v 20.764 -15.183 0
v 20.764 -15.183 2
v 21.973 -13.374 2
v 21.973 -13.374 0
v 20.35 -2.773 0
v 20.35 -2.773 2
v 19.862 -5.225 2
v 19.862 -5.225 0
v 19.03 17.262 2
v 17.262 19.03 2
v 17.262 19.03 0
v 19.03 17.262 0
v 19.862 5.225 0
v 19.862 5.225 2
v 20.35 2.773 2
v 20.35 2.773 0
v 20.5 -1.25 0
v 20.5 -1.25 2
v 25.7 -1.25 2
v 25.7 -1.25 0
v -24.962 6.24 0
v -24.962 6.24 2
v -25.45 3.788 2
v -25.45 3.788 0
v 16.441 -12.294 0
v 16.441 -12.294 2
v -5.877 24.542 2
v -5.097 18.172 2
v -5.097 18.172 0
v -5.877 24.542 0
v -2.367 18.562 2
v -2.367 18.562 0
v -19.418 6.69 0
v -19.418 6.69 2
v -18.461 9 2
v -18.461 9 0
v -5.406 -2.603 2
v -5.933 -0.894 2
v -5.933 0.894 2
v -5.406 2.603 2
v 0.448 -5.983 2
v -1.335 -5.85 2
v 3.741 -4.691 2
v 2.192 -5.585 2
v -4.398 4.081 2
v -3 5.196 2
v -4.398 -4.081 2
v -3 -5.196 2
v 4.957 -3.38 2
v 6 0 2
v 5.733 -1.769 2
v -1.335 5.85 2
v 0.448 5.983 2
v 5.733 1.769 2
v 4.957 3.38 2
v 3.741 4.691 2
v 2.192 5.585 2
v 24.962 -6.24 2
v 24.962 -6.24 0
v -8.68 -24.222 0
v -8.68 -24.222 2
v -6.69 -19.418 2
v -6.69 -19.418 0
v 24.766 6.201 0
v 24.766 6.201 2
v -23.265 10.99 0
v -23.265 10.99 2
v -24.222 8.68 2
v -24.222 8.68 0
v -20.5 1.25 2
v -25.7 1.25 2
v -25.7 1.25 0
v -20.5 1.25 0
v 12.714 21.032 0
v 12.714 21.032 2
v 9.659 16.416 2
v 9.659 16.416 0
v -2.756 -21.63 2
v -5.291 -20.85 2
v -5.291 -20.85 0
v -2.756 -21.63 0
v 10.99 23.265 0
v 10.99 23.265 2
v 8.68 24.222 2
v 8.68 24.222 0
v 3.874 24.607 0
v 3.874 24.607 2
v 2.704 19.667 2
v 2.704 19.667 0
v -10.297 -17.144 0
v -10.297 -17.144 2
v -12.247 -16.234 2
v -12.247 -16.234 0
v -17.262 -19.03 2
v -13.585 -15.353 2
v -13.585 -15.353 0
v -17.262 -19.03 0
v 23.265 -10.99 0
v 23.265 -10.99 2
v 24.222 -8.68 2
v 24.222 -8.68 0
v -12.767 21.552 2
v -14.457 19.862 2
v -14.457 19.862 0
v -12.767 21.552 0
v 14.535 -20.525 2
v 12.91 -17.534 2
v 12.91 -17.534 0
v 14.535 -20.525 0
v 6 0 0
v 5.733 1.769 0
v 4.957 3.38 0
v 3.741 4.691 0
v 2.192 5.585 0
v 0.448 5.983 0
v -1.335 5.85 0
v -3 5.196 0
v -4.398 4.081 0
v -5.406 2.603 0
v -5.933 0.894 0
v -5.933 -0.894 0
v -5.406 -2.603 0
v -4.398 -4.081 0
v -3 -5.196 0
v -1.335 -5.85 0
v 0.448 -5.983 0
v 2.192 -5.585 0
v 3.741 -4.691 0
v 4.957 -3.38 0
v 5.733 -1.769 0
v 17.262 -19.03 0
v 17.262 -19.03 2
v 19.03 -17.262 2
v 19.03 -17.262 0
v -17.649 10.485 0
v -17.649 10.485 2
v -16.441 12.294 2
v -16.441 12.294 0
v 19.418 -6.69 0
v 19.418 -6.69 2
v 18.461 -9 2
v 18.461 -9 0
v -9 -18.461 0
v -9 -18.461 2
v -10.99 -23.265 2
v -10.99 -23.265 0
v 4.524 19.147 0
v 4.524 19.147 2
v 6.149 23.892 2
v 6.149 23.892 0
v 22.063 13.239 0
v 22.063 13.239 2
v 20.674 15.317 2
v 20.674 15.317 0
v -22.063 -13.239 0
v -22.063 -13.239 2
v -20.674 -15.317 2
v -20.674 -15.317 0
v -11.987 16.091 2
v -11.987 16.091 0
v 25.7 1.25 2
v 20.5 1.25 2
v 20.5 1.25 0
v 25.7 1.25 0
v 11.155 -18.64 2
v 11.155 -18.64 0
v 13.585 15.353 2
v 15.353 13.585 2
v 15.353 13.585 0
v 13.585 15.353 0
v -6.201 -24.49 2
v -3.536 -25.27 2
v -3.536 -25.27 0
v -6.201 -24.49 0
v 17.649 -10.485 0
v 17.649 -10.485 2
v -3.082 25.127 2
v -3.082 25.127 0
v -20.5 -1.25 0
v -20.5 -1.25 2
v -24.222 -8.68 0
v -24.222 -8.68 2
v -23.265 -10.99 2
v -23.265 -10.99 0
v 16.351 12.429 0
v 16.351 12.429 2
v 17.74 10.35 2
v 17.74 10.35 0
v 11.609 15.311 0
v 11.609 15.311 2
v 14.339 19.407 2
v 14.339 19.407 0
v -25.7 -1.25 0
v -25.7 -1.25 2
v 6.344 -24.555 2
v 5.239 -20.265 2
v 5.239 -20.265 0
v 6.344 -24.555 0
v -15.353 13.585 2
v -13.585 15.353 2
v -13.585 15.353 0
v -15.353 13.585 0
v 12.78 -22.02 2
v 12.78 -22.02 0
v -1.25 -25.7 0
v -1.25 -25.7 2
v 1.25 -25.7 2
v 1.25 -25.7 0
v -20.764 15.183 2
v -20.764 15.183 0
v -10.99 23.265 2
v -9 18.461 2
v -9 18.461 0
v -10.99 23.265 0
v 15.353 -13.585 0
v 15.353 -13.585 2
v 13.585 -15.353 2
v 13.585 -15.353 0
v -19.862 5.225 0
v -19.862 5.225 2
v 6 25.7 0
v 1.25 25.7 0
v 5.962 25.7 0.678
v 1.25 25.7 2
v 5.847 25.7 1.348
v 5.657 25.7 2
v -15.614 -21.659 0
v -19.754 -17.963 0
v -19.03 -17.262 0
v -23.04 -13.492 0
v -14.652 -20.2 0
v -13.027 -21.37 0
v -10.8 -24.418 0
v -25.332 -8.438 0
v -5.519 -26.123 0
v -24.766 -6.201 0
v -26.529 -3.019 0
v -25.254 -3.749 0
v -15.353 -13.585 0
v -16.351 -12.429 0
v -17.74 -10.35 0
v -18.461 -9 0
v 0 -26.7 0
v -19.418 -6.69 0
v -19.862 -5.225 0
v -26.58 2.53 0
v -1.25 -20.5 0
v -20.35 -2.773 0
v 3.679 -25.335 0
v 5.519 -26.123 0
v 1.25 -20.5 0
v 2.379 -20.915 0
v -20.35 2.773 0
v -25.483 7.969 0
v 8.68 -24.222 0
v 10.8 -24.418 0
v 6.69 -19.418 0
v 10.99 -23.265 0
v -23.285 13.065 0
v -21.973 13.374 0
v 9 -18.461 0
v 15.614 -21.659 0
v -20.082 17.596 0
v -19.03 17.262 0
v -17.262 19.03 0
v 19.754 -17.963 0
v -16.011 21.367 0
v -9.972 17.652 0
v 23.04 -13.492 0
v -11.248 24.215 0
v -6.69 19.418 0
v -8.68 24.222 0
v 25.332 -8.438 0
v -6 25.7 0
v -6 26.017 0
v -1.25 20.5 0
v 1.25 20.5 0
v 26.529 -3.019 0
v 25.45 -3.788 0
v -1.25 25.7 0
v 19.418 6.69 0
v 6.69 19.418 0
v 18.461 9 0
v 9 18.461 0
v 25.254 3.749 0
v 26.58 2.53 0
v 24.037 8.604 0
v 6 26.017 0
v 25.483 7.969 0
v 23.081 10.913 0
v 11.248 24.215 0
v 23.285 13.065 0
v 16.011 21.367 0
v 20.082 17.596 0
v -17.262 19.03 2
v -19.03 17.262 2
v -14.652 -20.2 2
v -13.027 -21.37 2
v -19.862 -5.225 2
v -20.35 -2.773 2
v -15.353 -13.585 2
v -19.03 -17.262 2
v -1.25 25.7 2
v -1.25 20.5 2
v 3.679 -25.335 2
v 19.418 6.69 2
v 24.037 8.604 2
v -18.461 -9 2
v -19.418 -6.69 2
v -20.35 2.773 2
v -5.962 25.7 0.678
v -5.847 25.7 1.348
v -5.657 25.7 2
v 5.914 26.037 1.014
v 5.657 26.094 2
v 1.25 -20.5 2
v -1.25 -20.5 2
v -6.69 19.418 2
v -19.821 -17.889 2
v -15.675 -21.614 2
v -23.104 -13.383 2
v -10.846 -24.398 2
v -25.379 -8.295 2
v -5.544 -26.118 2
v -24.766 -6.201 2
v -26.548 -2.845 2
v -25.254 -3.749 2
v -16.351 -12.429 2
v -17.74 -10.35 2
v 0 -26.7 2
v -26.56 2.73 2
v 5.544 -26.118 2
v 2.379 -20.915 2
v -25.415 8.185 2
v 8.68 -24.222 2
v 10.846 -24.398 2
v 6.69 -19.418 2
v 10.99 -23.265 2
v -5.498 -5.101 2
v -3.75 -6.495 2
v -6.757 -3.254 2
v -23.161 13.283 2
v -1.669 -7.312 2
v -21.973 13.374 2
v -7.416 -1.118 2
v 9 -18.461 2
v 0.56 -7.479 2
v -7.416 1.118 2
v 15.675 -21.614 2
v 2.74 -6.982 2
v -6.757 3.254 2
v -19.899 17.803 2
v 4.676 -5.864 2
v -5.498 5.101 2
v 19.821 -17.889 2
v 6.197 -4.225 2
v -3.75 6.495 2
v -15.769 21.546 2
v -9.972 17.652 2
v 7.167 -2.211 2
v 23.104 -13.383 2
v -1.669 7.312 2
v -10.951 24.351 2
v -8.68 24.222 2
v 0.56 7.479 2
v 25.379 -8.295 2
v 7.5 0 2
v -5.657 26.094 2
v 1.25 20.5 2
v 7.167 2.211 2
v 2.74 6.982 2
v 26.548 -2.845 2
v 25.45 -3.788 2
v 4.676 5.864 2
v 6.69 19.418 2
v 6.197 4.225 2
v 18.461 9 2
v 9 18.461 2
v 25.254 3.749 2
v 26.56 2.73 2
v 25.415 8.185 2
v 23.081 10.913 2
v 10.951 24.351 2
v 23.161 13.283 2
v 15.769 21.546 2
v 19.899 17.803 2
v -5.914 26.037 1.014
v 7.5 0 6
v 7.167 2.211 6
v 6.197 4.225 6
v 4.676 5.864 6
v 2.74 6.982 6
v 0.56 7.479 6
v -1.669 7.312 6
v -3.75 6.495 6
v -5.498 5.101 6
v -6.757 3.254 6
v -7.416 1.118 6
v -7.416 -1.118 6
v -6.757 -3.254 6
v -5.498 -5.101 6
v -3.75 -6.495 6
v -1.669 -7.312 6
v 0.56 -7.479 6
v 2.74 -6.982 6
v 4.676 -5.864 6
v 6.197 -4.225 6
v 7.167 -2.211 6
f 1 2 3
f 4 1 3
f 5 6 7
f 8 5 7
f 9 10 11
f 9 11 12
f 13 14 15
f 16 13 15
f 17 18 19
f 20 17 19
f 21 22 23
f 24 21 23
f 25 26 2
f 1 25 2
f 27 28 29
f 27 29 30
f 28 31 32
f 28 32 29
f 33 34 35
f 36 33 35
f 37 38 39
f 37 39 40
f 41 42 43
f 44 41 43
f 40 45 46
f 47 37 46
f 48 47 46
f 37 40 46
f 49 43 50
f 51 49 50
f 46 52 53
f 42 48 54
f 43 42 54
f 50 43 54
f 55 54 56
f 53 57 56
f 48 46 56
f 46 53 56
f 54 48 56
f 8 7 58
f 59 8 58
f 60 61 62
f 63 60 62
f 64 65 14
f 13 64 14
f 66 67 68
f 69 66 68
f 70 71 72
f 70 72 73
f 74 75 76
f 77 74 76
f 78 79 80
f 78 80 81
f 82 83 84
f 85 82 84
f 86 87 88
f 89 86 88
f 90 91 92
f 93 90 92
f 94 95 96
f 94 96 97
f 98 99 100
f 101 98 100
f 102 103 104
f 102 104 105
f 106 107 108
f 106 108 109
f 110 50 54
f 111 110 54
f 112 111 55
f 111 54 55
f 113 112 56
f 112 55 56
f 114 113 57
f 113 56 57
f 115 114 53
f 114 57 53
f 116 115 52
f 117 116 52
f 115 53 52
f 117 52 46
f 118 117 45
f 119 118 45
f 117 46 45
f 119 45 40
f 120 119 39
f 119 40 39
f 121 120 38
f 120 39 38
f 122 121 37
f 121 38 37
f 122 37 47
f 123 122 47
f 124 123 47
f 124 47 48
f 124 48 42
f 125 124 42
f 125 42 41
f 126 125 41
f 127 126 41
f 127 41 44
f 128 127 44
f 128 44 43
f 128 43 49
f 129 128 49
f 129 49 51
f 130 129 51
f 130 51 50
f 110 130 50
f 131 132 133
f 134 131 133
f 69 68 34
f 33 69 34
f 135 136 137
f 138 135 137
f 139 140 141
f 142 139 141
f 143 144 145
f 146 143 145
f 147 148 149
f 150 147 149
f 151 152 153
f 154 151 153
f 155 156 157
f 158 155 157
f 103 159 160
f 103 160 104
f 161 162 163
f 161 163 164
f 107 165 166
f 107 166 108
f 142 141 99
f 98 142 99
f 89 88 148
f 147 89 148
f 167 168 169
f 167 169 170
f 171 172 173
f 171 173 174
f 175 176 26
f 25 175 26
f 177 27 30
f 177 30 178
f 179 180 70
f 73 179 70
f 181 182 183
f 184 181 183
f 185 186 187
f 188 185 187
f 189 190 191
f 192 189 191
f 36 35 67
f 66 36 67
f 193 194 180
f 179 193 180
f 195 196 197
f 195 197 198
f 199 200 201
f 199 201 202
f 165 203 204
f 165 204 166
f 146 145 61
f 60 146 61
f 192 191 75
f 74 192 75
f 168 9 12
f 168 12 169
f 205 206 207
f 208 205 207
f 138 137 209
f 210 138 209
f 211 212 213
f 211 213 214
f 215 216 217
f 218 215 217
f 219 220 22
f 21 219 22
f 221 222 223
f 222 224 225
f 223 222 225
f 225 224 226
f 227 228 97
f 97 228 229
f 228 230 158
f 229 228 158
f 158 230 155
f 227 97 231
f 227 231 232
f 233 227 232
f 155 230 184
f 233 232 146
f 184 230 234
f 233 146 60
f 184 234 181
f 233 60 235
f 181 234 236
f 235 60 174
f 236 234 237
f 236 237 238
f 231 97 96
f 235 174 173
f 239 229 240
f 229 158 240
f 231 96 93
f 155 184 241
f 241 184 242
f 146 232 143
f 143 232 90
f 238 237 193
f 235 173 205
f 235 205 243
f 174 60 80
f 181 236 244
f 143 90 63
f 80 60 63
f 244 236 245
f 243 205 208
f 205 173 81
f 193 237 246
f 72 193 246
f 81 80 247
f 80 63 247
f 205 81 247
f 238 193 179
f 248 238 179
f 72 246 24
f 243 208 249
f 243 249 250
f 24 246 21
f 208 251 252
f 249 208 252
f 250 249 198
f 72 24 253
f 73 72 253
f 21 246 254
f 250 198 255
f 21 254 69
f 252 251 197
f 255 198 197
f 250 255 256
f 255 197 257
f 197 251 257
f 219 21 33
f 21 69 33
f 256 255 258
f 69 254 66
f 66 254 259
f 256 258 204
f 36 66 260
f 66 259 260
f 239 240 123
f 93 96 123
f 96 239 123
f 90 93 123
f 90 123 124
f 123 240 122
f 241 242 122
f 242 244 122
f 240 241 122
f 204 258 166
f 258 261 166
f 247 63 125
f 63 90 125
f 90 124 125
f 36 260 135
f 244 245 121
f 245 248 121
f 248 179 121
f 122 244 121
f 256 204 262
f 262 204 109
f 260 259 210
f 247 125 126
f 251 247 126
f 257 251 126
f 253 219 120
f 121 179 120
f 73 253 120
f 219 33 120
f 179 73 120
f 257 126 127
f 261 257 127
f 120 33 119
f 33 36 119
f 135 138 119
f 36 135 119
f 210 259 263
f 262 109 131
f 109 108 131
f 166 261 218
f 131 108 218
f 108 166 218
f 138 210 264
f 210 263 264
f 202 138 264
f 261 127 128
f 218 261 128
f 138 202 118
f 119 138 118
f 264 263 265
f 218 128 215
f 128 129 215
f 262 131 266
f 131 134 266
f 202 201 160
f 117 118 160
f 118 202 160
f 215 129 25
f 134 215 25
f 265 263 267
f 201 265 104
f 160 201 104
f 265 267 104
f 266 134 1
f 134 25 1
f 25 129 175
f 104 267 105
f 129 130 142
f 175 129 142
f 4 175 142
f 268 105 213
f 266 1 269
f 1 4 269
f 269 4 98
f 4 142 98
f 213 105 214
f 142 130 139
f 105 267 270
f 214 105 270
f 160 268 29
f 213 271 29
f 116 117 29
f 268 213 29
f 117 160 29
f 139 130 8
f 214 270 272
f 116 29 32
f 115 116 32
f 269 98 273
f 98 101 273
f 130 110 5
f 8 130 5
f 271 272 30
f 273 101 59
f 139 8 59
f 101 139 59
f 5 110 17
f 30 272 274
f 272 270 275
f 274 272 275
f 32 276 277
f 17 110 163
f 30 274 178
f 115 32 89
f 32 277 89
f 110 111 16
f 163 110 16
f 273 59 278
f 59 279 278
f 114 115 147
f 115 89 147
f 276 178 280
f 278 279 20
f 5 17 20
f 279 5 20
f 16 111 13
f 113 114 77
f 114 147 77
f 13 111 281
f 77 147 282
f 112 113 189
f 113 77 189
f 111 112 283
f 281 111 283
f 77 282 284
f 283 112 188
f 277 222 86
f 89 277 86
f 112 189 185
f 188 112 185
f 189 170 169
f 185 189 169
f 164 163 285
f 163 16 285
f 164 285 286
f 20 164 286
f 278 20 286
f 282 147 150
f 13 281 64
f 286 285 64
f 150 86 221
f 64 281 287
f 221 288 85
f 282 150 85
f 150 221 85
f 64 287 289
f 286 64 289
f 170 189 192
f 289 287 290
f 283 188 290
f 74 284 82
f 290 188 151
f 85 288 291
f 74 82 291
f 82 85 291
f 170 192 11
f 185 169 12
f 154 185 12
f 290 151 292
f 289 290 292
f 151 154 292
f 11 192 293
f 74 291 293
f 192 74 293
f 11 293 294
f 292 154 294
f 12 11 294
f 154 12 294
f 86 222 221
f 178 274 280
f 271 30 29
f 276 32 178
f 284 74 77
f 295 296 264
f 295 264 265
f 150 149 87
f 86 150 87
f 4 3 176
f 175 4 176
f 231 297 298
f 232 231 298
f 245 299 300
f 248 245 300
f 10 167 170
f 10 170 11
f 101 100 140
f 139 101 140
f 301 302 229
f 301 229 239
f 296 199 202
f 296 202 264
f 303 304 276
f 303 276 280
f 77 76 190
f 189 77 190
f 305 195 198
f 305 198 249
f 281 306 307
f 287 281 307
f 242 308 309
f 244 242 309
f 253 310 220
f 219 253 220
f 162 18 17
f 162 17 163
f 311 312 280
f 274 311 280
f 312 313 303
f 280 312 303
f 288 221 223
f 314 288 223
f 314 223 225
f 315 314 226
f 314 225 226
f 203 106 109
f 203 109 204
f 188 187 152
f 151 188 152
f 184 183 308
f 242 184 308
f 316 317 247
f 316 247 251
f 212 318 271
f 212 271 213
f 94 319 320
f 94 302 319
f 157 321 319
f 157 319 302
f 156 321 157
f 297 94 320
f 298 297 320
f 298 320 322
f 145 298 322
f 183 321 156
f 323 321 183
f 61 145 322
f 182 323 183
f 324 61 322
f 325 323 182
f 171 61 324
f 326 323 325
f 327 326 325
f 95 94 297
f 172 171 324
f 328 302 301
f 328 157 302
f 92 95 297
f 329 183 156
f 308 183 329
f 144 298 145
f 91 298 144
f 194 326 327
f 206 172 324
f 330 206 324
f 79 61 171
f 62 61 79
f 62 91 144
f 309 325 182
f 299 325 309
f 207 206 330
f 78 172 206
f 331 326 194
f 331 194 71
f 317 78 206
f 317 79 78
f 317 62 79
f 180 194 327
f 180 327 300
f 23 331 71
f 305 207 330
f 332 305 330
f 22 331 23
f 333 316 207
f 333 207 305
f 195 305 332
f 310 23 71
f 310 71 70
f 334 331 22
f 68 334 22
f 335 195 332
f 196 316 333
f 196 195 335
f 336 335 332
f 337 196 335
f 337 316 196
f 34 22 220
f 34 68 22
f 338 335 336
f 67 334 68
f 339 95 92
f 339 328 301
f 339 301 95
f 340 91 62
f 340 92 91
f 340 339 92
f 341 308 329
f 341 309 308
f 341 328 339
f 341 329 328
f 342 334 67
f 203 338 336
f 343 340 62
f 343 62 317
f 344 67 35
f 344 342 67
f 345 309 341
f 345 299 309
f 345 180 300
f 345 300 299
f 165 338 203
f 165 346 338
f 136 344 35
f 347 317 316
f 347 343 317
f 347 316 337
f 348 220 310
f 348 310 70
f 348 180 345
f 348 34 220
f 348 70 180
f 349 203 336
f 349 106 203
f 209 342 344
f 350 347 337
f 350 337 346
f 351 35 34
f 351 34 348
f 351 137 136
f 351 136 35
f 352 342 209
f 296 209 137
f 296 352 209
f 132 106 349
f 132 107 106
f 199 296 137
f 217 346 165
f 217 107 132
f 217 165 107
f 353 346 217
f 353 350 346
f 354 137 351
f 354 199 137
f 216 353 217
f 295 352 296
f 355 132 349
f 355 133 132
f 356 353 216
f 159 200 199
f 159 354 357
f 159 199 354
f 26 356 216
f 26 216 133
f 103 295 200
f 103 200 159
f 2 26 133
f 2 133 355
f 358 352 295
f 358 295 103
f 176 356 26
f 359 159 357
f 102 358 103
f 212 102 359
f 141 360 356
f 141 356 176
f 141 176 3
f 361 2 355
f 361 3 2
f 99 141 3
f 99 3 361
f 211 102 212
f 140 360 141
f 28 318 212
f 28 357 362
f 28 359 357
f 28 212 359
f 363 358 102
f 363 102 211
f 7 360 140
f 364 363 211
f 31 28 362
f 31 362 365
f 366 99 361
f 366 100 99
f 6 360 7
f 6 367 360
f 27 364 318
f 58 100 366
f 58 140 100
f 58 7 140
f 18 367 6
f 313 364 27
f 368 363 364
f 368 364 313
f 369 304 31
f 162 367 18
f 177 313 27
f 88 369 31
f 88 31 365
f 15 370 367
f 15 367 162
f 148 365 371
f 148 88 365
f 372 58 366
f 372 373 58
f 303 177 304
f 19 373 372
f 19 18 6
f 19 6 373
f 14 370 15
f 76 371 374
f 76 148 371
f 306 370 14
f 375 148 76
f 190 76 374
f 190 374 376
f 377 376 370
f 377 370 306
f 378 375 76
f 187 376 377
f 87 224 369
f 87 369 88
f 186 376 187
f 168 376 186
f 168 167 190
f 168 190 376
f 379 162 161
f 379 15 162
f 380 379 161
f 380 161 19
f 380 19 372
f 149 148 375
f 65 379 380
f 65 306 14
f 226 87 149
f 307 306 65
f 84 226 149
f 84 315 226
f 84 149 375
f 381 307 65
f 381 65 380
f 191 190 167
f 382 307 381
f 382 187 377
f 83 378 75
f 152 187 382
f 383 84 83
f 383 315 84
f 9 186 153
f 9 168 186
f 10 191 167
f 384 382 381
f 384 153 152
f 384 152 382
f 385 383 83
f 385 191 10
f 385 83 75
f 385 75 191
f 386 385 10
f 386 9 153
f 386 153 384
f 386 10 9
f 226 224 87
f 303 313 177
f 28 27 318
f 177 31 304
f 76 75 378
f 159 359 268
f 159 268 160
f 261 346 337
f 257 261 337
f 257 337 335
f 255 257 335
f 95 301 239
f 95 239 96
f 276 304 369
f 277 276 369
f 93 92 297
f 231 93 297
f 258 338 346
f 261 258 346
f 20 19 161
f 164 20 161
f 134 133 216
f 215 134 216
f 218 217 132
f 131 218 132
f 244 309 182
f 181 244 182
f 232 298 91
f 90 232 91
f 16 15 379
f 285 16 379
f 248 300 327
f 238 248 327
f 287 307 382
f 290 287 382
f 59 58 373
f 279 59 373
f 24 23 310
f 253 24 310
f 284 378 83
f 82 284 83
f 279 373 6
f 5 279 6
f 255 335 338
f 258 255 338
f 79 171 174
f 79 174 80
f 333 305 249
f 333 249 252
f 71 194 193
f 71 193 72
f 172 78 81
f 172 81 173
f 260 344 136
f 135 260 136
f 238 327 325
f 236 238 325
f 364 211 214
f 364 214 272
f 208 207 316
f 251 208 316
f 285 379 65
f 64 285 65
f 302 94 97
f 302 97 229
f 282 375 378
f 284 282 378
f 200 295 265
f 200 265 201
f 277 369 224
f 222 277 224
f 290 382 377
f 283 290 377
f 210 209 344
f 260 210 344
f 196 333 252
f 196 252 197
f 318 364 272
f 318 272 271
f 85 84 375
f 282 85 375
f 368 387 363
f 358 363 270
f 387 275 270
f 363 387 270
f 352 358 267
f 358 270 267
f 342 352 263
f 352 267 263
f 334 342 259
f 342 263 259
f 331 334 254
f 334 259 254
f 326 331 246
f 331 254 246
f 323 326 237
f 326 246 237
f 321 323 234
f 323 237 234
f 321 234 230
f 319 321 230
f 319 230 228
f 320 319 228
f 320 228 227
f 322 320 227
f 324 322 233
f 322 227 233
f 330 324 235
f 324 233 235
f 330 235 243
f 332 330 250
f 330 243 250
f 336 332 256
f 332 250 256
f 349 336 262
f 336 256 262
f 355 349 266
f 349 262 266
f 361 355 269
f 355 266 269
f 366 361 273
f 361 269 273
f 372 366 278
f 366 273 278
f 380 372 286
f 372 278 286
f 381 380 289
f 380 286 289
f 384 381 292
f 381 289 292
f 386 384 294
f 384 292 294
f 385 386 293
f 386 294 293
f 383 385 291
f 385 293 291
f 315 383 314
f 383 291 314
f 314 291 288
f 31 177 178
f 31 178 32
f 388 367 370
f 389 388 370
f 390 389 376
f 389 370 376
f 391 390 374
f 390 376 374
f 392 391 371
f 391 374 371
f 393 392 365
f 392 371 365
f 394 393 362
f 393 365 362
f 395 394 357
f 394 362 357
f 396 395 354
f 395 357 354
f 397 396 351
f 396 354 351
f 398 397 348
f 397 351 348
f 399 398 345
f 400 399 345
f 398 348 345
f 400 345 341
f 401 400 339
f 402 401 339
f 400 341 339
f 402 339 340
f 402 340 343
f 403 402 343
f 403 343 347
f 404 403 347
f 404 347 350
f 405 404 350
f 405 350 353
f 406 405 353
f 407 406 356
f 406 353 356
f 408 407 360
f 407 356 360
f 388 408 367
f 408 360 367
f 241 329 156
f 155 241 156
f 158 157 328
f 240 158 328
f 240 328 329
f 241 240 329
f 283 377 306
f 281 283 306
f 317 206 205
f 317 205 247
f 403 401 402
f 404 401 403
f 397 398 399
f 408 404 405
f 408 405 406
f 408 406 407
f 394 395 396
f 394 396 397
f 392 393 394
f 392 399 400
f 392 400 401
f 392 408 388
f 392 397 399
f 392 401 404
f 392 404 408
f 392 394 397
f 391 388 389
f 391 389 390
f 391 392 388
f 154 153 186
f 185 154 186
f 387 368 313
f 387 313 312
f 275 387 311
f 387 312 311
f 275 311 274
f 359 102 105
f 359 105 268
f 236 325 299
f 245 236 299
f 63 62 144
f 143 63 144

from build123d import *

# Parameters (mm, degrees)
SKETCH_R        = 26.7
PAD_DEPTH       = 2
SKETCH001_W     = 5.2
SKETCH001_H     = 2.5
SKETCH001_W_2   = 2.5
SKETCH001_H_2   = 5.2
POCKET_DEPTH    = 2.001
SKETCH002_R     = 6
POCKET001_DEPTH = 2.001
SKETCH003_R     = 7.5
PAD001_DEPTH    = 4
SKETCH004_R     = 6
POCKET002_DEPTH = 1.001
SKETCH005_W     = 2
SKETCH005_H     = 2.479431
SKETCH005_H_2   = 2.486512
POCKET003_DEPTH = 1


with BuildPart() as part:
    # Sketch → Pad (new body)
    with BuildSketch(Plane.XY):
        Circle(SKETCH_R)
    extrude(amount=PAD_DEPTH)

    # Sketch001 → Pocket (cut, through all)
    with BuildSketch(Plane.XY.offset(2)):
        with Locations((-23.1, 0)):
            Rectangle(SKETCH001_W, SKETCH001_H)
        with Locations((23.1, 0)):
            Rectangle(SKETCH001_W, SKETCH001_H)
        with Locations((0, 23.1)):
            Rectangle(SKETCH001_W_2, SKETCH001_H_2)
        with Locations((0, -23.1)):
            Rectangle(SKETCH001_W_2, SKETCH001_H_2)
        Polygon((-19.029555, 17.261788), (-17.261788, 19.029555), (-13.584833, 15.3526), (-15.3526, 13.584833), align=None)
        Polygon((17.261788, 19.029555), (19.029555, 17.261788), (15.3526, 13.584833), (13.584833, 15.3526), align=None)
        Polygon((17.261788, -19.029555), (19.029555, -17.261788), (15.3526, -13.584833), (13.584833, -15.3526), align=None)
        Polygon((-17.261788, -19.029555), (-19.029555, -17.261788), (-15.3526, -13.584833), (-13.584833, -15.3526), align=None)
        Polygon((8.680115, 24.222058), (6.690161, 19.417885), (8.99986, 18.461176), (10.989814, 23.26535), align=None)
        Polygon((18.461176, 8.99986), (19.417885, 6.690161), (24.037282, 8.603578), (23.080574, 10.913277), align=None)
        Polygon((-23.26535, 10.989814), (-24.222058, 8.680115), (-19.417885, 6.690161), (-18.461176, 8.99986), align=None)
        Polygon((-24.222058, -8.680115), (-23.26535, -10.989814), (-18.461176, -8.99986), (-19.417885, -6.690161), align=None)
        Polygon((-10.989814, -23.26535), (-8.680115, -24.222058), (-6.690161, -19.417885), (-8.99986, -18.461176), align=None)
        Polygon((6.690161, -19.417885), (8.680115, -24.222058), (10.989814, -23.26535), (8.99986, -18.461176), align=None)
        Polygon((19.417885, -6.690161), (18.461176, -8.99986), (23.26535, -10.989814), (24.222058, -8.680115), align=None)
        Polygon((-10.989814, 23.26535), (-8.680115, 24.222058), (-6.690161, 19.417885), (-8.99986, 18.461176), align=None)
        Polygon((19.862235, 5.225333), (20.349961, 2.77337), (25.253888, 3.748822), (24.766162, 6.200785), align=None)
        Polygon((-25.253888, -3.748822), (-24.766162, -6.200785), (-19.862235, -5.225333), (-20.349961, -2.77337), align=None)
        Polygon((-24.962319, 6.239803), (-25.450045, 3.78784), (-20.349961, 2.77337), (-19.862235, 5.225333), align=None)
        Polygon((-20.764428, 15.182615), (-21.97311, 13.373695), (-17.649468, 10.48473), (-16.440786, 12.29365), align=None)
        Polygon((-14.45738, 19.861687), (-12.767282, 21.551783), (-9.972119, 17.651556), (-11.987236, 16.091467), align=None)
        Polygon((-5.876879, 24.541956), (-3.081719, 25.126991), (-2.366674, 18.561611), (-5.096836, 18.171587), align=None)
        Polygon((3.873685, 24.60696), (2.70362, 19.666674), (4.523721, 19.146645), (6.148817, 23.891918), align=None)
        Polygon((12.714202, 21.031754), (9.659025, 16.416485), (11.609138, 15.311421), (14.339291, 19.406658), align=None)
        Polygon((16.350664, 12.428527), (17.73959, 10.349853), (22.063232, 13.238818), (20.674306, 15.317492), align=None)
        Polygon((20.349961, -2.77337), (19.862235, -5.225333), (24.962319, -6.239803), (25.450045, -3.78784), align=None)
        Polygon((17.649468, -10.48473), (16.440786, -12.29365), (20.764428, -15.182615), (21.97311, -13.373695), align=None)
        Polygon((11.154702, -18.639545), (12.909801, -17.534479), (14.534897, -20.524654), (12.779791, -22.019741), align=None)
        Polygon((2.379186, -20.914677), (5.239352, -20.264639), (6.344416, -24.554888), (3.679265, -25.334934), align=None)
        Polygon((-2.756109, -21.629719), (-3.536156, -25.26993), (-6.201311, -24.489885), (-5.291257, -20.849672), align=None)
        Polygon((-14.651802, -20.199635), (-13.026706, -21.369703), (-10.296549, -17.144459), (-12.246662, -16.234406), align=None)
        Polygon((-22.063232, -13.238818), (-20.674306, -15.317492), (-16.350664, -12.428527), (-17.73959, -10.349853), align=None)
    extrude(amount=-POCKET_DEPTH, mode=Mode.SUBTRACT)

    # Sketch002 → Pocket001 (cut, through all)
    with BuildSketch(Plane.XY.offset(2)):
        Circle(SKETCH002_R)
    extrude(amount=-POCKET001_DEPTH, mode=Mode.SUBTRACT)

    # Sketch003 → Pad001 (new body)
    with BuildSketch(Plane.XY.offset(2)):
        Circle(SKETCH003_R)
    extrude(amount=PAD001_DEPTH)

    # Sketch004 → Pocket002 (cut, through all)
    with BuildSketch(Plane.XZ.offset(-25.7)):
        Circle(SKETCH004_R)
    extrude(amount=-POCKET002_DEPTH, mode=Mode.SUBTRACT)

    # Sketch005 → Pocket003 (cut)
    with BuildSketch(Plane(origin=(0, 25.7, 0), x_dir=(-1, 0, 0), z_dir=(0, 1, 0))):
        with Locations((0, -6.731688)):
            Rectangle(SKETCH005_W, SKETCH005_H)
        with Locations((0, 6.735229)):
            Rectangle(SKETCH005_W, SKETCH005_H_2)
    extrude(amount=-POCKET003_DEPTH, mode=Mode.SUBTRACT)


solid = part.part
